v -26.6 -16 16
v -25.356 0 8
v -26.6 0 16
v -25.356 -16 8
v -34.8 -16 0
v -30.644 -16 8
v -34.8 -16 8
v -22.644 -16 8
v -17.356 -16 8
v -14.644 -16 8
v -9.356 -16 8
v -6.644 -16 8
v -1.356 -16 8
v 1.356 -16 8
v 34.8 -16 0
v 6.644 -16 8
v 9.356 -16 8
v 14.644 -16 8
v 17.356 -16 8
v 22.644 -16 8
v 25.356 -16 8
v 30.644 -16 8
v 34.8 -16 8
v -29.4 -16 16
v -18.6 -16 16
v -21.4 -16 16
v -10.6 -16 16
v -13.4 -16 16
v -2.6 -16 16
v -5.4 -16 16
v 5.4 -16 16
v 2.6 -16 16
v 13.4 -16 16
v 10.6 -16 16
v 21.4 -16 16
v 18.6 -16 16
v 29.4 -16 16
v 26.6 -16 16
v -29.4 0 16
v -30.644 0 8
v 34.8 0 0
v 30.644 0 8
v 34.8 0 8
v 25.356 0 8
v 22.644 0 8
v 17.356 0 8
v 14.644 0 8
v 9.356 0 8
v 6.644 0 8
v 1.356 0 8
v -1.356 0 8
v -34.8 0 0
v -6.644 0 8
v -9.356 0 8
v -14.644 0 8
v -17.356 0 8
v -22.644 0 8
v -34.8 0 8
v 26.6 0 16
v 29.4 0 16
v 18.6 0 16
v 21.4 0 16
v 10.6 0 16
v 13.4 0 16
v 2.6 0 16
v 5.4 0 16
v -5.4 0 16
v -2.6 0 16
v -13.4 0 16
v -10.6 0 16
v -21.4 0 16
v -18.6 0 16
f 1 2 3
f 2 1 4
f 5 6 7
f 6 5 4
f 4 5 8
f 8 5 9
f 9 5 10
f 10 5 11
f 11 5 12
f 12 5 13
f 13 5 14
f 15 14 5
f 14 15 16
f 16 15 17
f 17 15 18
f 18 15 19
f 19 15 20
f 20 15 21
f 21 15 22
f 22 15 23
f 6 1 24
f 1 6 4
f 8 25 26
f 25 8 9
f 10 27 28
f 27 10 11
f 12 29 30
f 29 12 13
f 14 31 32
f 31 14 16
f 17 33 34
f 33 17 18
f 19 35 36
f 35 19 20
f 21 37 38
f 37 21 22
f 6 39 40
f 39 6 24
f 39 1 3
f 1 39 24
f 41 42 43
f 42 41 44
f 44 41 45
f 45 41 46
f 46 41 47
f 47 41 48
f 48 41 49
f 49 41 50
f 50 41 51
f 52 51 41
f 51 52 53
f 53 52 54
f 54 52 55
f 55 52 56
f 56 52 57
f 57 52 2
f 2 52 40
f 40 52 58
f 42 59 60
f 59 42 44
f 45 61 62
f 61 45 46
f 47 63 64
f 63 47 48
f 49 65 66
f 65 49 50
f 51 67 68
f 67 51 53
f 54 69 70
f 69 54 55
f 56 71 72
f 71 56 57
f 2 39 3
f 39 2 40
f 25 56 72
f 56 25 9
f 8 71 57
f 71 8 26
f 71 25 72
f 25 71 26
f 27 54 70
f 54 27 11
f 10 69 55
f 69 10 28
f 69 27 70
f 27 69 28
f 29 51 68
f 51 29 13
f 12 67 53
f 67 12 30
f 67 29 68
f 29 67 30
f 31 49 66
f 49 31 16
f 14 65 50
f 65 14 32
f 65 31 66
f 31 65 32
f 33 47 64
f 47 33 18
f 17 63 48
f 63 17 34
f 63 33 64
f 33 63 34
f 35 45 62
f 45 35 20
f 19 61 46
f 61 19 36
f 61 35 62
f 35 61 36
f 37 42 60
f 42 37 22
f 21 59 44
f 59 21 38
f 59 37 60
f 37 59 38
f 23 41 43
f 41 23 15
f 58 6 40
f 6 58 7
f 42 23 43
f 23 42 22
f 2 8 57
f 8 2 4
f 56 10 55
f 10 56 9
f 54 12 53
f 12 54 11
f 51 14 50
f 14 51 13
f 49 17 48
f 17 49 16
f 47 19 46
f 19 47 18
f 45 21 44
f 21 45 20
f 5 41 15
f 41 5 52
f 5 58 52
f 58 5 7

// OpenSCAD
$fn = 32;

// ----------------------------------------------------------------------
// Toothed rack, 8 teeth
// 8 mm pitch, 8 mm teeth
// ----------------------------------------------------------------------

// --- parameters (mm) ---
bar_w = 16;     // bar width (Y)
bar_h = 8;      // bar height (Z)
teeth = 8;      // number of teeth
pitch = 8;      // tooth pitch
tooth_h = 8;    // tooth height above the bar
root_w = 5.6;   // tooth width at the root
crest_w = 2.8;  // tooth width at the crest

// --- derived feature positions (mm) ---
span = (teeth - 1) * pitch;  // = 56   distance between the outer teeth
bar_l = span + root_w + 8;   // = 69.6   bar length: teeth plus 4 mm at each end
tooth_x = -span / 2;         // = -28   X of the first tooth
height = bar_h + tooth_h;    // = 16   overall height
feature_centers = [
  [tooth_x + 0 * pitch, -bar_w / 2],
  [tooth_x + 1 * pitch, -bar_w / 2],
  [tooth_x + 2 * pitch, -bar_w / 2],
  [tooth_x + 3 * pitch, -bar_w / 2],
  [tooth_x + 4 * pitch, -bar_w / 2],
  [tooth_x + 5 * pitch, -bar_w / 2],
  [tooth_x + 6 * pitch, -bar_w / 2],
  [tooth_x + 7 * pitch, -bar_w / 2]
];   // tooth centre line, drives the tooth loop

// bar with a rack of teeth, one extruded trapezoium per centre
module rack_tooth() {
  linear_extrude(height = bar_w)
    polygon(points = [
      [0, 0],
      [root_w, 0],
      [root_w / 2 + crest_w / 2, tooth_h + 1],
      [root_w / 2 - crest_w / 2, tooth_h + 1]
    ]);
}

union() {
  translate([-bar_l / 2, -bar_w, 0]) cube([bar_l, bar_w, bar_h]);
  for (centre = feature_centers)
    translate([centre[0] - root_w / 2, 0, bar_h - 1]) rotate([90, 0, 0]) rack_tooth();
}
